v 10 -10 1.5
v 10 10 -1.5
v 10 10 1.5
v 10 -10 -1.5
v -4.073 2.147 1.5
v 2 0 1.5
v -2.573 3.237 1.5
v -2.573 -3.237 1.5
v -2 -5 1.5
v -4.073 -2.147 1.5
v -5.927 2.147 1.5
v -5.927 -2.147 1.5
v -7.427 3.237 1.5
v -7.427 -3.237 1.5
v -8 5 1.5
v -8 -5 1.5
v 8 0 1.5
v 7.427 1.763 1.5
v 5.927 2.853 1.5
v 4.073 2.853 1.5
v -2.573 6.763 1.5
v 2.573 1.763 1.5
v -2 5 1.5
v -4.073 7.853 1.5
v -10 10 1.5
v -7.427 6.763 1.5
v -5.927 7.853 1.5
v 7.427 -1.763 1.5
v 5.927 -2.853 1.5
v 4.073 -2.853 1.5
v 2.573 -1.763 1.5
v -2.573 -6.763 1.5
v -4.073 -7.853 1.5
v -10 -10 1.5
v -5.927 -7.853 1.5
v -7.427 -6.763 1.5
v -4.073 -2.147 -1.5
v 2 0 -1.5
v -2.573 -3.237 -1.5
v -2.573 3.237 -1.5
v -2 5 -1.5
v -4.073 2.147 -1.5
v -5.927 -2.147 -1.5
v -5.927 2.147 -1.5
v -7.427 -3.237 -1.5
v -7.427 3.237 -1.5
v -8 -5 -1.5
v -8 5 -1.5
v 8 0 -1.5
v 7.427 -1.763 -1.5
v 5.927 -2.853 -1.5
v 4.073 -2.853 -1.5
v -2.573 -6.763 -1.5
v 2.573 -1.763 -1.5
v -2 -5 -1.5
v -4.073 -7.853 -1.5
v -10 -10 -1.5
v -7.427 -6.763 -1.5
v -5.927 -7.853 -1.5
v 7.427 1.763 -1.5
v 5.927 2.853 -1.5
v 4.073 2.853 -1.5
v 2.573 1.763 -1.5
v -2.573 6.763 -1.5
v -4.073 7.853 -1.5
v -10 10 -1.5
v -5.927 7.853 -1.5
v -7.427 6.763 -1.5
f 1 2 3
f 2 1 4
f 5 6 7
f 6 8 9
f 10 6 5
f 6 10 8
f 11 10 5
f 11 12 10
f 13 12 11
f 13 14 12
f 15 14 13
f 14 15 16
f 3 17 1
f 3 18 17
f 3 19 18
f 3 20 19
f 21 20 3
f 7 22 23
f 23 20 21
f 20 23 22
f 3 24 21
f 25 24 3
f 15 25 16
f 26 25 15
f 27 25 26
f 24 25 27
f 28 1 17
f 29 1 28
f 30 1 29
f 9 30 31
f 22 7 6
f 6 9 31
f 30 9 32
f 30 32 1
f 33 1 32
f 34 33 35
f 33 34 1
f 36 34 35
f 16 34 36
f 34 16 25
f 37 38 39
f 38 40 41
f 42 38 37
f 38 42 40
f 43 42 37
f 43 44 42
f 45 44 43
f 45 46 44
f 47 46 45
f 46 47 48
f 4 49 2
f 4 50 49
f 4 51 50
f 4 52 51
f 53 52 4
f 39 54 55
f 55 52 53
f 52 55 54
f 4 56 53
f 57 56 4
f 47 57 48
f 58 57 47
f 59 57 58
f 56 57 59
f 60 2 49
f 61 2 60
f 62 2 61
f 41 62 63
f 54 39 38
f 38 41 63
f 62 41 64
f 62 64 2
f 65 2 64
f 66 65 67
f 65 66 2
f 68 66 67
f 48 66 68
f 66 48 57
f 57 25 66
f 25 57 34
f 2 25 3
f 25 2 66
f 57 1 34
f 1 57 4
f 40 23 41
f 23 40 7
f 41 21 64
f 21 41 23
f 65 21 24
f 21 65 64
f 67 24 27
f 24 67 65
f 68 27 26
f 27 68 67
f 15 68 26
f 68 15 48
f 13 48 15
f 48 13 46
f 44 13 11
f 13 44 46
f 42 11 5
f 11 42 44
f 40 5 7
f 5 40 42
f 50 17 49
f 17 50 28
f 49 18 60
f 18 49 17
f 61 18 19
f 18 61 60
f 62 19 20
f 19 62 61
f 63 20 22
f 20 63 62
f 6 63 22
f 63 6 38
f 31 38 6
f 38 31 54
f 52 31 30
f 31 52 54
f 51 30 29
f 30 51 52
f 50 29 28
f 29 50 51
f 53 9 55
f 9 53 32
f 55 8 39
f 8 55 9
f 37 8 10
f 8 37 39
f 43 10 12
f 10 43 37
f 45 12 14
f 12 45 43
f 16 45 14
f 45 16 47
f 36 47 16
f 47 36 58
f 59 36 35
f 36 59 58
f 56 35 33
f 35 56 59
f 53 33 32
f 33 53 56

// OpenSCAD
difference() {
    cube([20,20,3], center=true);

    linear_extrude(height=10, center=true, convexity=2) {
        translate([5,0]) circle(r=3);
        translate([-5,5]) circle(r=3);
        translate([-5,-5]) circle(r=3);
    }
}
